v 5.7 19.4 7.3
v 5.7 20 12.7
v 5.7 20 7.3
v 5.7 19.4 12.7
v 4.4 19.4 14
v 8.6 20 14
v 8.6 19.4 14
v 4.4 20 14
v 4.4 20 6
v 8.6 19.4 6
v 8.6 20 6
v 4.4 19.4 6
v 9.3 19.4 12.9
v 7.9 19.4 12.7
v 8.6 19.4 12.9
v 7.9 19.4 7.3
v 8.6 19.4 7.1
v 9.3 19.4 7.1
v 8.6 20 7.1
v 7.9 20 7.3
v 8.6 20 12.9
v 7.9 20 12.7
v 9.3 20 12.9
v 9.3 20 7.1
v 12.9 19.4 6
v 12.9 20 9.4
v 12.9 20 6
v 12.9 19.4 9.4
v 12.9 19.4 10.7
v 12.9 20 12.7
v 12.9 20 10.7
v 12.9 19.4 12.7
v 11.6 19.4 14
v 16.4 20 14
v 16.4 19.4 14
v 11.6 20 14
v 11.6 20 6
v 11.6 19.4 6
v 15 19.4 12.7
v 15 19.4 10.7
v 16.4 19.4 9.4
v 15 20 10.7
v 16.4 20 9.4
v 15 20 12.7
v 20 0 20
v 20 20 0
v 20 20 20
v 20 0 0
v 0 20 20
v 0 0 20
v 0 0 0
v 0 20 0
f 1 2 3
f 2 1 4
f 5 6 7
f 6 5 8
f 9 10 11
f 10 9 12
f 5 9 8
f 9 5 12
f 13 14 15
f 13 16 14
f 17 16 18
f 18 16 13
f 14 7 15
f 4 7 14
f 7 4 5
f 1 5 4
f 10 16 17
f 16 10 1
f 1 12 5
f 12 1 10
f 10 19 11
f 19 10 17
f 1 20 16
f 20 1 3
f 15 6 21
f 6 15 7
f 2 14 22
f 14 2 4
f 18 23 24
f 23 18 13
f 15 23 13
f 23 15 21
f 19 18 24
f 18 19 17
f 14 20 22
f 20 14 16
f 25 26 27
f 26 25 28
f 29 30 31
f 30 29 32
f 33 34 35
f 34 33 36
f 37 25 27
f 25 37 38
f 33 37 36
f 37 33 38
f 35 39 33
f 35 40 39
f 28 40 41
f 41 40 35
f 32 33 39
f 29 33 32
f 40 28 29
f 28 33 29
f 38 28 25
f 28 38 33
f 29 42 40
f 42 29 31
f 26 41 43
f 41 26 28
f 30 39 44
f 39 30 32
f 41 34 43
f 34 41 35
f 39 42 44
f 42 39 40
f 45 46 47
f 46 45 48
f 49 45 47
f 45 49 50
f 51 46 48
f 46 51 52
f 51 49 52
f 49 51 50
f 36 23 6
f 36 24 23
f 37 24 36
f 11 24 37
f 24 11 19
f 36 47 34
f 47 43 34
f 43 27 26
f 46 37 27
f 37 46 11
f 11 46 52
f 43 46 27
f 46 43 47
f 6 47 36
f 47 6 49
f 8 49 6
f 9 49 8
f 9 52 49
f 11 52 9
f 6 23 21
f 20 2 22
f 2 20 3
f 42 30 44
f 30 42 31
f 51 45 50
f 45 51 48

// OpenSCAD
// Fixture: 20mm cube with etched initials on the front (mm)
// Region default (unspecified): largest vertical face / front (+Y).
// Etch depth 0.6 mm — visible, leaves #11 1.6 mm walls on this solid host.
// Honest stub: block initials, not Style2Fab / text().
$fn = 48;
size = 20;
etch_depth = 0.6;
difference() {
  cube(size, center = false);
  union() {
    translate([4.4, 19.4, 6]) cube([1.3, 0.8, 8]);
    translate([4.4, 19.4, 6]) cube([4.2, 0.8, 1.3]);
    translate([4.4, 19.4, 12.7]) cube([4.2, 0.8, 1.3]);
    translate([7.9, 19.4, 7.1]) cube([1.4, 0.8, 5.8]);
    translate([11.6, 19.4, 6]) cube([1.3, 0.8, 8]);
    translate([11.6, 19.4, 9.4]) cube([4.4, 0.8, 1.3]);
    translate([11.6, 19.4, 12.7]) cube([4.4, 0.8, 1.3]);
    translate([15, 19.4, 9.4]) cube([1.4, 0.8, 4.6]);
  }
}
